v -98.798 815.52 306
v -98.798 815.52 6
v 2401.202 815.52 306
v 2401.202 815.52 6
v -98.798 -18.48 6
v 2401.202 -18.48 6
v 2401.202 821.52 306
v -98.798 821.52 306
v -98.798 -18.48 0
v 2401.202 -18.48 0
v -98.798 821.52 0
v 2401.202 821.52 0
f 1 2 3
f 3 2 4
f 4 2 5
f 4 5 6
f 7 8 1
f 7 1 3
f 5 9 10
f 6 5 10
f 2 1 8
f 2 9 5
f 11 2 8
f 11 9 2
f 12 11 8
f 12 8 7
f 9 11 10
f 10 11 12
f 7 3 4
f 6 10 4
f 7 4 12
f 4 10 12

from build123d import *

# Parameters (mm, degrees)
F0_W      = 2500
F0_H      = 840
F1_DEPTH  = 6
F2_W      = 2500
F2_H      = 6
F3_DEPTH  = 25
F3_FACE_W = 2500
F3_FACE_H = 6
F4_DEPTH  = 275


with BuildPart() as f1:
    # F0 (on Top) → F1 (new body)
    with BuildSketch(Plane.XY):
        with Locations((1151.201837, 401.51958)):
            Rectangle(F0_W, F0_H)
    extrude(amount=F1_DEPTH)

    # F2 (on face) → F3 (join)
    with BuildSketch(Plane.XY.offset(6)):
        with Locations((1151.201837, 818.51958)):
            Rectangle(F2_W, F2_H)
    extrude(amount=F3_DEPTH)

    # F3_face (on face) → F4 (join)
    with BuildSketch(Plane(origin=(1151.201837, 818.51958, 31), x_dir=(1, 0, 0), z_dir=(0, 0, 1))):
        Rectangle(F3_FACE_W, F3_FACE_H)
    extrude(amount=F4_DEPTH)


solid = f1.part
